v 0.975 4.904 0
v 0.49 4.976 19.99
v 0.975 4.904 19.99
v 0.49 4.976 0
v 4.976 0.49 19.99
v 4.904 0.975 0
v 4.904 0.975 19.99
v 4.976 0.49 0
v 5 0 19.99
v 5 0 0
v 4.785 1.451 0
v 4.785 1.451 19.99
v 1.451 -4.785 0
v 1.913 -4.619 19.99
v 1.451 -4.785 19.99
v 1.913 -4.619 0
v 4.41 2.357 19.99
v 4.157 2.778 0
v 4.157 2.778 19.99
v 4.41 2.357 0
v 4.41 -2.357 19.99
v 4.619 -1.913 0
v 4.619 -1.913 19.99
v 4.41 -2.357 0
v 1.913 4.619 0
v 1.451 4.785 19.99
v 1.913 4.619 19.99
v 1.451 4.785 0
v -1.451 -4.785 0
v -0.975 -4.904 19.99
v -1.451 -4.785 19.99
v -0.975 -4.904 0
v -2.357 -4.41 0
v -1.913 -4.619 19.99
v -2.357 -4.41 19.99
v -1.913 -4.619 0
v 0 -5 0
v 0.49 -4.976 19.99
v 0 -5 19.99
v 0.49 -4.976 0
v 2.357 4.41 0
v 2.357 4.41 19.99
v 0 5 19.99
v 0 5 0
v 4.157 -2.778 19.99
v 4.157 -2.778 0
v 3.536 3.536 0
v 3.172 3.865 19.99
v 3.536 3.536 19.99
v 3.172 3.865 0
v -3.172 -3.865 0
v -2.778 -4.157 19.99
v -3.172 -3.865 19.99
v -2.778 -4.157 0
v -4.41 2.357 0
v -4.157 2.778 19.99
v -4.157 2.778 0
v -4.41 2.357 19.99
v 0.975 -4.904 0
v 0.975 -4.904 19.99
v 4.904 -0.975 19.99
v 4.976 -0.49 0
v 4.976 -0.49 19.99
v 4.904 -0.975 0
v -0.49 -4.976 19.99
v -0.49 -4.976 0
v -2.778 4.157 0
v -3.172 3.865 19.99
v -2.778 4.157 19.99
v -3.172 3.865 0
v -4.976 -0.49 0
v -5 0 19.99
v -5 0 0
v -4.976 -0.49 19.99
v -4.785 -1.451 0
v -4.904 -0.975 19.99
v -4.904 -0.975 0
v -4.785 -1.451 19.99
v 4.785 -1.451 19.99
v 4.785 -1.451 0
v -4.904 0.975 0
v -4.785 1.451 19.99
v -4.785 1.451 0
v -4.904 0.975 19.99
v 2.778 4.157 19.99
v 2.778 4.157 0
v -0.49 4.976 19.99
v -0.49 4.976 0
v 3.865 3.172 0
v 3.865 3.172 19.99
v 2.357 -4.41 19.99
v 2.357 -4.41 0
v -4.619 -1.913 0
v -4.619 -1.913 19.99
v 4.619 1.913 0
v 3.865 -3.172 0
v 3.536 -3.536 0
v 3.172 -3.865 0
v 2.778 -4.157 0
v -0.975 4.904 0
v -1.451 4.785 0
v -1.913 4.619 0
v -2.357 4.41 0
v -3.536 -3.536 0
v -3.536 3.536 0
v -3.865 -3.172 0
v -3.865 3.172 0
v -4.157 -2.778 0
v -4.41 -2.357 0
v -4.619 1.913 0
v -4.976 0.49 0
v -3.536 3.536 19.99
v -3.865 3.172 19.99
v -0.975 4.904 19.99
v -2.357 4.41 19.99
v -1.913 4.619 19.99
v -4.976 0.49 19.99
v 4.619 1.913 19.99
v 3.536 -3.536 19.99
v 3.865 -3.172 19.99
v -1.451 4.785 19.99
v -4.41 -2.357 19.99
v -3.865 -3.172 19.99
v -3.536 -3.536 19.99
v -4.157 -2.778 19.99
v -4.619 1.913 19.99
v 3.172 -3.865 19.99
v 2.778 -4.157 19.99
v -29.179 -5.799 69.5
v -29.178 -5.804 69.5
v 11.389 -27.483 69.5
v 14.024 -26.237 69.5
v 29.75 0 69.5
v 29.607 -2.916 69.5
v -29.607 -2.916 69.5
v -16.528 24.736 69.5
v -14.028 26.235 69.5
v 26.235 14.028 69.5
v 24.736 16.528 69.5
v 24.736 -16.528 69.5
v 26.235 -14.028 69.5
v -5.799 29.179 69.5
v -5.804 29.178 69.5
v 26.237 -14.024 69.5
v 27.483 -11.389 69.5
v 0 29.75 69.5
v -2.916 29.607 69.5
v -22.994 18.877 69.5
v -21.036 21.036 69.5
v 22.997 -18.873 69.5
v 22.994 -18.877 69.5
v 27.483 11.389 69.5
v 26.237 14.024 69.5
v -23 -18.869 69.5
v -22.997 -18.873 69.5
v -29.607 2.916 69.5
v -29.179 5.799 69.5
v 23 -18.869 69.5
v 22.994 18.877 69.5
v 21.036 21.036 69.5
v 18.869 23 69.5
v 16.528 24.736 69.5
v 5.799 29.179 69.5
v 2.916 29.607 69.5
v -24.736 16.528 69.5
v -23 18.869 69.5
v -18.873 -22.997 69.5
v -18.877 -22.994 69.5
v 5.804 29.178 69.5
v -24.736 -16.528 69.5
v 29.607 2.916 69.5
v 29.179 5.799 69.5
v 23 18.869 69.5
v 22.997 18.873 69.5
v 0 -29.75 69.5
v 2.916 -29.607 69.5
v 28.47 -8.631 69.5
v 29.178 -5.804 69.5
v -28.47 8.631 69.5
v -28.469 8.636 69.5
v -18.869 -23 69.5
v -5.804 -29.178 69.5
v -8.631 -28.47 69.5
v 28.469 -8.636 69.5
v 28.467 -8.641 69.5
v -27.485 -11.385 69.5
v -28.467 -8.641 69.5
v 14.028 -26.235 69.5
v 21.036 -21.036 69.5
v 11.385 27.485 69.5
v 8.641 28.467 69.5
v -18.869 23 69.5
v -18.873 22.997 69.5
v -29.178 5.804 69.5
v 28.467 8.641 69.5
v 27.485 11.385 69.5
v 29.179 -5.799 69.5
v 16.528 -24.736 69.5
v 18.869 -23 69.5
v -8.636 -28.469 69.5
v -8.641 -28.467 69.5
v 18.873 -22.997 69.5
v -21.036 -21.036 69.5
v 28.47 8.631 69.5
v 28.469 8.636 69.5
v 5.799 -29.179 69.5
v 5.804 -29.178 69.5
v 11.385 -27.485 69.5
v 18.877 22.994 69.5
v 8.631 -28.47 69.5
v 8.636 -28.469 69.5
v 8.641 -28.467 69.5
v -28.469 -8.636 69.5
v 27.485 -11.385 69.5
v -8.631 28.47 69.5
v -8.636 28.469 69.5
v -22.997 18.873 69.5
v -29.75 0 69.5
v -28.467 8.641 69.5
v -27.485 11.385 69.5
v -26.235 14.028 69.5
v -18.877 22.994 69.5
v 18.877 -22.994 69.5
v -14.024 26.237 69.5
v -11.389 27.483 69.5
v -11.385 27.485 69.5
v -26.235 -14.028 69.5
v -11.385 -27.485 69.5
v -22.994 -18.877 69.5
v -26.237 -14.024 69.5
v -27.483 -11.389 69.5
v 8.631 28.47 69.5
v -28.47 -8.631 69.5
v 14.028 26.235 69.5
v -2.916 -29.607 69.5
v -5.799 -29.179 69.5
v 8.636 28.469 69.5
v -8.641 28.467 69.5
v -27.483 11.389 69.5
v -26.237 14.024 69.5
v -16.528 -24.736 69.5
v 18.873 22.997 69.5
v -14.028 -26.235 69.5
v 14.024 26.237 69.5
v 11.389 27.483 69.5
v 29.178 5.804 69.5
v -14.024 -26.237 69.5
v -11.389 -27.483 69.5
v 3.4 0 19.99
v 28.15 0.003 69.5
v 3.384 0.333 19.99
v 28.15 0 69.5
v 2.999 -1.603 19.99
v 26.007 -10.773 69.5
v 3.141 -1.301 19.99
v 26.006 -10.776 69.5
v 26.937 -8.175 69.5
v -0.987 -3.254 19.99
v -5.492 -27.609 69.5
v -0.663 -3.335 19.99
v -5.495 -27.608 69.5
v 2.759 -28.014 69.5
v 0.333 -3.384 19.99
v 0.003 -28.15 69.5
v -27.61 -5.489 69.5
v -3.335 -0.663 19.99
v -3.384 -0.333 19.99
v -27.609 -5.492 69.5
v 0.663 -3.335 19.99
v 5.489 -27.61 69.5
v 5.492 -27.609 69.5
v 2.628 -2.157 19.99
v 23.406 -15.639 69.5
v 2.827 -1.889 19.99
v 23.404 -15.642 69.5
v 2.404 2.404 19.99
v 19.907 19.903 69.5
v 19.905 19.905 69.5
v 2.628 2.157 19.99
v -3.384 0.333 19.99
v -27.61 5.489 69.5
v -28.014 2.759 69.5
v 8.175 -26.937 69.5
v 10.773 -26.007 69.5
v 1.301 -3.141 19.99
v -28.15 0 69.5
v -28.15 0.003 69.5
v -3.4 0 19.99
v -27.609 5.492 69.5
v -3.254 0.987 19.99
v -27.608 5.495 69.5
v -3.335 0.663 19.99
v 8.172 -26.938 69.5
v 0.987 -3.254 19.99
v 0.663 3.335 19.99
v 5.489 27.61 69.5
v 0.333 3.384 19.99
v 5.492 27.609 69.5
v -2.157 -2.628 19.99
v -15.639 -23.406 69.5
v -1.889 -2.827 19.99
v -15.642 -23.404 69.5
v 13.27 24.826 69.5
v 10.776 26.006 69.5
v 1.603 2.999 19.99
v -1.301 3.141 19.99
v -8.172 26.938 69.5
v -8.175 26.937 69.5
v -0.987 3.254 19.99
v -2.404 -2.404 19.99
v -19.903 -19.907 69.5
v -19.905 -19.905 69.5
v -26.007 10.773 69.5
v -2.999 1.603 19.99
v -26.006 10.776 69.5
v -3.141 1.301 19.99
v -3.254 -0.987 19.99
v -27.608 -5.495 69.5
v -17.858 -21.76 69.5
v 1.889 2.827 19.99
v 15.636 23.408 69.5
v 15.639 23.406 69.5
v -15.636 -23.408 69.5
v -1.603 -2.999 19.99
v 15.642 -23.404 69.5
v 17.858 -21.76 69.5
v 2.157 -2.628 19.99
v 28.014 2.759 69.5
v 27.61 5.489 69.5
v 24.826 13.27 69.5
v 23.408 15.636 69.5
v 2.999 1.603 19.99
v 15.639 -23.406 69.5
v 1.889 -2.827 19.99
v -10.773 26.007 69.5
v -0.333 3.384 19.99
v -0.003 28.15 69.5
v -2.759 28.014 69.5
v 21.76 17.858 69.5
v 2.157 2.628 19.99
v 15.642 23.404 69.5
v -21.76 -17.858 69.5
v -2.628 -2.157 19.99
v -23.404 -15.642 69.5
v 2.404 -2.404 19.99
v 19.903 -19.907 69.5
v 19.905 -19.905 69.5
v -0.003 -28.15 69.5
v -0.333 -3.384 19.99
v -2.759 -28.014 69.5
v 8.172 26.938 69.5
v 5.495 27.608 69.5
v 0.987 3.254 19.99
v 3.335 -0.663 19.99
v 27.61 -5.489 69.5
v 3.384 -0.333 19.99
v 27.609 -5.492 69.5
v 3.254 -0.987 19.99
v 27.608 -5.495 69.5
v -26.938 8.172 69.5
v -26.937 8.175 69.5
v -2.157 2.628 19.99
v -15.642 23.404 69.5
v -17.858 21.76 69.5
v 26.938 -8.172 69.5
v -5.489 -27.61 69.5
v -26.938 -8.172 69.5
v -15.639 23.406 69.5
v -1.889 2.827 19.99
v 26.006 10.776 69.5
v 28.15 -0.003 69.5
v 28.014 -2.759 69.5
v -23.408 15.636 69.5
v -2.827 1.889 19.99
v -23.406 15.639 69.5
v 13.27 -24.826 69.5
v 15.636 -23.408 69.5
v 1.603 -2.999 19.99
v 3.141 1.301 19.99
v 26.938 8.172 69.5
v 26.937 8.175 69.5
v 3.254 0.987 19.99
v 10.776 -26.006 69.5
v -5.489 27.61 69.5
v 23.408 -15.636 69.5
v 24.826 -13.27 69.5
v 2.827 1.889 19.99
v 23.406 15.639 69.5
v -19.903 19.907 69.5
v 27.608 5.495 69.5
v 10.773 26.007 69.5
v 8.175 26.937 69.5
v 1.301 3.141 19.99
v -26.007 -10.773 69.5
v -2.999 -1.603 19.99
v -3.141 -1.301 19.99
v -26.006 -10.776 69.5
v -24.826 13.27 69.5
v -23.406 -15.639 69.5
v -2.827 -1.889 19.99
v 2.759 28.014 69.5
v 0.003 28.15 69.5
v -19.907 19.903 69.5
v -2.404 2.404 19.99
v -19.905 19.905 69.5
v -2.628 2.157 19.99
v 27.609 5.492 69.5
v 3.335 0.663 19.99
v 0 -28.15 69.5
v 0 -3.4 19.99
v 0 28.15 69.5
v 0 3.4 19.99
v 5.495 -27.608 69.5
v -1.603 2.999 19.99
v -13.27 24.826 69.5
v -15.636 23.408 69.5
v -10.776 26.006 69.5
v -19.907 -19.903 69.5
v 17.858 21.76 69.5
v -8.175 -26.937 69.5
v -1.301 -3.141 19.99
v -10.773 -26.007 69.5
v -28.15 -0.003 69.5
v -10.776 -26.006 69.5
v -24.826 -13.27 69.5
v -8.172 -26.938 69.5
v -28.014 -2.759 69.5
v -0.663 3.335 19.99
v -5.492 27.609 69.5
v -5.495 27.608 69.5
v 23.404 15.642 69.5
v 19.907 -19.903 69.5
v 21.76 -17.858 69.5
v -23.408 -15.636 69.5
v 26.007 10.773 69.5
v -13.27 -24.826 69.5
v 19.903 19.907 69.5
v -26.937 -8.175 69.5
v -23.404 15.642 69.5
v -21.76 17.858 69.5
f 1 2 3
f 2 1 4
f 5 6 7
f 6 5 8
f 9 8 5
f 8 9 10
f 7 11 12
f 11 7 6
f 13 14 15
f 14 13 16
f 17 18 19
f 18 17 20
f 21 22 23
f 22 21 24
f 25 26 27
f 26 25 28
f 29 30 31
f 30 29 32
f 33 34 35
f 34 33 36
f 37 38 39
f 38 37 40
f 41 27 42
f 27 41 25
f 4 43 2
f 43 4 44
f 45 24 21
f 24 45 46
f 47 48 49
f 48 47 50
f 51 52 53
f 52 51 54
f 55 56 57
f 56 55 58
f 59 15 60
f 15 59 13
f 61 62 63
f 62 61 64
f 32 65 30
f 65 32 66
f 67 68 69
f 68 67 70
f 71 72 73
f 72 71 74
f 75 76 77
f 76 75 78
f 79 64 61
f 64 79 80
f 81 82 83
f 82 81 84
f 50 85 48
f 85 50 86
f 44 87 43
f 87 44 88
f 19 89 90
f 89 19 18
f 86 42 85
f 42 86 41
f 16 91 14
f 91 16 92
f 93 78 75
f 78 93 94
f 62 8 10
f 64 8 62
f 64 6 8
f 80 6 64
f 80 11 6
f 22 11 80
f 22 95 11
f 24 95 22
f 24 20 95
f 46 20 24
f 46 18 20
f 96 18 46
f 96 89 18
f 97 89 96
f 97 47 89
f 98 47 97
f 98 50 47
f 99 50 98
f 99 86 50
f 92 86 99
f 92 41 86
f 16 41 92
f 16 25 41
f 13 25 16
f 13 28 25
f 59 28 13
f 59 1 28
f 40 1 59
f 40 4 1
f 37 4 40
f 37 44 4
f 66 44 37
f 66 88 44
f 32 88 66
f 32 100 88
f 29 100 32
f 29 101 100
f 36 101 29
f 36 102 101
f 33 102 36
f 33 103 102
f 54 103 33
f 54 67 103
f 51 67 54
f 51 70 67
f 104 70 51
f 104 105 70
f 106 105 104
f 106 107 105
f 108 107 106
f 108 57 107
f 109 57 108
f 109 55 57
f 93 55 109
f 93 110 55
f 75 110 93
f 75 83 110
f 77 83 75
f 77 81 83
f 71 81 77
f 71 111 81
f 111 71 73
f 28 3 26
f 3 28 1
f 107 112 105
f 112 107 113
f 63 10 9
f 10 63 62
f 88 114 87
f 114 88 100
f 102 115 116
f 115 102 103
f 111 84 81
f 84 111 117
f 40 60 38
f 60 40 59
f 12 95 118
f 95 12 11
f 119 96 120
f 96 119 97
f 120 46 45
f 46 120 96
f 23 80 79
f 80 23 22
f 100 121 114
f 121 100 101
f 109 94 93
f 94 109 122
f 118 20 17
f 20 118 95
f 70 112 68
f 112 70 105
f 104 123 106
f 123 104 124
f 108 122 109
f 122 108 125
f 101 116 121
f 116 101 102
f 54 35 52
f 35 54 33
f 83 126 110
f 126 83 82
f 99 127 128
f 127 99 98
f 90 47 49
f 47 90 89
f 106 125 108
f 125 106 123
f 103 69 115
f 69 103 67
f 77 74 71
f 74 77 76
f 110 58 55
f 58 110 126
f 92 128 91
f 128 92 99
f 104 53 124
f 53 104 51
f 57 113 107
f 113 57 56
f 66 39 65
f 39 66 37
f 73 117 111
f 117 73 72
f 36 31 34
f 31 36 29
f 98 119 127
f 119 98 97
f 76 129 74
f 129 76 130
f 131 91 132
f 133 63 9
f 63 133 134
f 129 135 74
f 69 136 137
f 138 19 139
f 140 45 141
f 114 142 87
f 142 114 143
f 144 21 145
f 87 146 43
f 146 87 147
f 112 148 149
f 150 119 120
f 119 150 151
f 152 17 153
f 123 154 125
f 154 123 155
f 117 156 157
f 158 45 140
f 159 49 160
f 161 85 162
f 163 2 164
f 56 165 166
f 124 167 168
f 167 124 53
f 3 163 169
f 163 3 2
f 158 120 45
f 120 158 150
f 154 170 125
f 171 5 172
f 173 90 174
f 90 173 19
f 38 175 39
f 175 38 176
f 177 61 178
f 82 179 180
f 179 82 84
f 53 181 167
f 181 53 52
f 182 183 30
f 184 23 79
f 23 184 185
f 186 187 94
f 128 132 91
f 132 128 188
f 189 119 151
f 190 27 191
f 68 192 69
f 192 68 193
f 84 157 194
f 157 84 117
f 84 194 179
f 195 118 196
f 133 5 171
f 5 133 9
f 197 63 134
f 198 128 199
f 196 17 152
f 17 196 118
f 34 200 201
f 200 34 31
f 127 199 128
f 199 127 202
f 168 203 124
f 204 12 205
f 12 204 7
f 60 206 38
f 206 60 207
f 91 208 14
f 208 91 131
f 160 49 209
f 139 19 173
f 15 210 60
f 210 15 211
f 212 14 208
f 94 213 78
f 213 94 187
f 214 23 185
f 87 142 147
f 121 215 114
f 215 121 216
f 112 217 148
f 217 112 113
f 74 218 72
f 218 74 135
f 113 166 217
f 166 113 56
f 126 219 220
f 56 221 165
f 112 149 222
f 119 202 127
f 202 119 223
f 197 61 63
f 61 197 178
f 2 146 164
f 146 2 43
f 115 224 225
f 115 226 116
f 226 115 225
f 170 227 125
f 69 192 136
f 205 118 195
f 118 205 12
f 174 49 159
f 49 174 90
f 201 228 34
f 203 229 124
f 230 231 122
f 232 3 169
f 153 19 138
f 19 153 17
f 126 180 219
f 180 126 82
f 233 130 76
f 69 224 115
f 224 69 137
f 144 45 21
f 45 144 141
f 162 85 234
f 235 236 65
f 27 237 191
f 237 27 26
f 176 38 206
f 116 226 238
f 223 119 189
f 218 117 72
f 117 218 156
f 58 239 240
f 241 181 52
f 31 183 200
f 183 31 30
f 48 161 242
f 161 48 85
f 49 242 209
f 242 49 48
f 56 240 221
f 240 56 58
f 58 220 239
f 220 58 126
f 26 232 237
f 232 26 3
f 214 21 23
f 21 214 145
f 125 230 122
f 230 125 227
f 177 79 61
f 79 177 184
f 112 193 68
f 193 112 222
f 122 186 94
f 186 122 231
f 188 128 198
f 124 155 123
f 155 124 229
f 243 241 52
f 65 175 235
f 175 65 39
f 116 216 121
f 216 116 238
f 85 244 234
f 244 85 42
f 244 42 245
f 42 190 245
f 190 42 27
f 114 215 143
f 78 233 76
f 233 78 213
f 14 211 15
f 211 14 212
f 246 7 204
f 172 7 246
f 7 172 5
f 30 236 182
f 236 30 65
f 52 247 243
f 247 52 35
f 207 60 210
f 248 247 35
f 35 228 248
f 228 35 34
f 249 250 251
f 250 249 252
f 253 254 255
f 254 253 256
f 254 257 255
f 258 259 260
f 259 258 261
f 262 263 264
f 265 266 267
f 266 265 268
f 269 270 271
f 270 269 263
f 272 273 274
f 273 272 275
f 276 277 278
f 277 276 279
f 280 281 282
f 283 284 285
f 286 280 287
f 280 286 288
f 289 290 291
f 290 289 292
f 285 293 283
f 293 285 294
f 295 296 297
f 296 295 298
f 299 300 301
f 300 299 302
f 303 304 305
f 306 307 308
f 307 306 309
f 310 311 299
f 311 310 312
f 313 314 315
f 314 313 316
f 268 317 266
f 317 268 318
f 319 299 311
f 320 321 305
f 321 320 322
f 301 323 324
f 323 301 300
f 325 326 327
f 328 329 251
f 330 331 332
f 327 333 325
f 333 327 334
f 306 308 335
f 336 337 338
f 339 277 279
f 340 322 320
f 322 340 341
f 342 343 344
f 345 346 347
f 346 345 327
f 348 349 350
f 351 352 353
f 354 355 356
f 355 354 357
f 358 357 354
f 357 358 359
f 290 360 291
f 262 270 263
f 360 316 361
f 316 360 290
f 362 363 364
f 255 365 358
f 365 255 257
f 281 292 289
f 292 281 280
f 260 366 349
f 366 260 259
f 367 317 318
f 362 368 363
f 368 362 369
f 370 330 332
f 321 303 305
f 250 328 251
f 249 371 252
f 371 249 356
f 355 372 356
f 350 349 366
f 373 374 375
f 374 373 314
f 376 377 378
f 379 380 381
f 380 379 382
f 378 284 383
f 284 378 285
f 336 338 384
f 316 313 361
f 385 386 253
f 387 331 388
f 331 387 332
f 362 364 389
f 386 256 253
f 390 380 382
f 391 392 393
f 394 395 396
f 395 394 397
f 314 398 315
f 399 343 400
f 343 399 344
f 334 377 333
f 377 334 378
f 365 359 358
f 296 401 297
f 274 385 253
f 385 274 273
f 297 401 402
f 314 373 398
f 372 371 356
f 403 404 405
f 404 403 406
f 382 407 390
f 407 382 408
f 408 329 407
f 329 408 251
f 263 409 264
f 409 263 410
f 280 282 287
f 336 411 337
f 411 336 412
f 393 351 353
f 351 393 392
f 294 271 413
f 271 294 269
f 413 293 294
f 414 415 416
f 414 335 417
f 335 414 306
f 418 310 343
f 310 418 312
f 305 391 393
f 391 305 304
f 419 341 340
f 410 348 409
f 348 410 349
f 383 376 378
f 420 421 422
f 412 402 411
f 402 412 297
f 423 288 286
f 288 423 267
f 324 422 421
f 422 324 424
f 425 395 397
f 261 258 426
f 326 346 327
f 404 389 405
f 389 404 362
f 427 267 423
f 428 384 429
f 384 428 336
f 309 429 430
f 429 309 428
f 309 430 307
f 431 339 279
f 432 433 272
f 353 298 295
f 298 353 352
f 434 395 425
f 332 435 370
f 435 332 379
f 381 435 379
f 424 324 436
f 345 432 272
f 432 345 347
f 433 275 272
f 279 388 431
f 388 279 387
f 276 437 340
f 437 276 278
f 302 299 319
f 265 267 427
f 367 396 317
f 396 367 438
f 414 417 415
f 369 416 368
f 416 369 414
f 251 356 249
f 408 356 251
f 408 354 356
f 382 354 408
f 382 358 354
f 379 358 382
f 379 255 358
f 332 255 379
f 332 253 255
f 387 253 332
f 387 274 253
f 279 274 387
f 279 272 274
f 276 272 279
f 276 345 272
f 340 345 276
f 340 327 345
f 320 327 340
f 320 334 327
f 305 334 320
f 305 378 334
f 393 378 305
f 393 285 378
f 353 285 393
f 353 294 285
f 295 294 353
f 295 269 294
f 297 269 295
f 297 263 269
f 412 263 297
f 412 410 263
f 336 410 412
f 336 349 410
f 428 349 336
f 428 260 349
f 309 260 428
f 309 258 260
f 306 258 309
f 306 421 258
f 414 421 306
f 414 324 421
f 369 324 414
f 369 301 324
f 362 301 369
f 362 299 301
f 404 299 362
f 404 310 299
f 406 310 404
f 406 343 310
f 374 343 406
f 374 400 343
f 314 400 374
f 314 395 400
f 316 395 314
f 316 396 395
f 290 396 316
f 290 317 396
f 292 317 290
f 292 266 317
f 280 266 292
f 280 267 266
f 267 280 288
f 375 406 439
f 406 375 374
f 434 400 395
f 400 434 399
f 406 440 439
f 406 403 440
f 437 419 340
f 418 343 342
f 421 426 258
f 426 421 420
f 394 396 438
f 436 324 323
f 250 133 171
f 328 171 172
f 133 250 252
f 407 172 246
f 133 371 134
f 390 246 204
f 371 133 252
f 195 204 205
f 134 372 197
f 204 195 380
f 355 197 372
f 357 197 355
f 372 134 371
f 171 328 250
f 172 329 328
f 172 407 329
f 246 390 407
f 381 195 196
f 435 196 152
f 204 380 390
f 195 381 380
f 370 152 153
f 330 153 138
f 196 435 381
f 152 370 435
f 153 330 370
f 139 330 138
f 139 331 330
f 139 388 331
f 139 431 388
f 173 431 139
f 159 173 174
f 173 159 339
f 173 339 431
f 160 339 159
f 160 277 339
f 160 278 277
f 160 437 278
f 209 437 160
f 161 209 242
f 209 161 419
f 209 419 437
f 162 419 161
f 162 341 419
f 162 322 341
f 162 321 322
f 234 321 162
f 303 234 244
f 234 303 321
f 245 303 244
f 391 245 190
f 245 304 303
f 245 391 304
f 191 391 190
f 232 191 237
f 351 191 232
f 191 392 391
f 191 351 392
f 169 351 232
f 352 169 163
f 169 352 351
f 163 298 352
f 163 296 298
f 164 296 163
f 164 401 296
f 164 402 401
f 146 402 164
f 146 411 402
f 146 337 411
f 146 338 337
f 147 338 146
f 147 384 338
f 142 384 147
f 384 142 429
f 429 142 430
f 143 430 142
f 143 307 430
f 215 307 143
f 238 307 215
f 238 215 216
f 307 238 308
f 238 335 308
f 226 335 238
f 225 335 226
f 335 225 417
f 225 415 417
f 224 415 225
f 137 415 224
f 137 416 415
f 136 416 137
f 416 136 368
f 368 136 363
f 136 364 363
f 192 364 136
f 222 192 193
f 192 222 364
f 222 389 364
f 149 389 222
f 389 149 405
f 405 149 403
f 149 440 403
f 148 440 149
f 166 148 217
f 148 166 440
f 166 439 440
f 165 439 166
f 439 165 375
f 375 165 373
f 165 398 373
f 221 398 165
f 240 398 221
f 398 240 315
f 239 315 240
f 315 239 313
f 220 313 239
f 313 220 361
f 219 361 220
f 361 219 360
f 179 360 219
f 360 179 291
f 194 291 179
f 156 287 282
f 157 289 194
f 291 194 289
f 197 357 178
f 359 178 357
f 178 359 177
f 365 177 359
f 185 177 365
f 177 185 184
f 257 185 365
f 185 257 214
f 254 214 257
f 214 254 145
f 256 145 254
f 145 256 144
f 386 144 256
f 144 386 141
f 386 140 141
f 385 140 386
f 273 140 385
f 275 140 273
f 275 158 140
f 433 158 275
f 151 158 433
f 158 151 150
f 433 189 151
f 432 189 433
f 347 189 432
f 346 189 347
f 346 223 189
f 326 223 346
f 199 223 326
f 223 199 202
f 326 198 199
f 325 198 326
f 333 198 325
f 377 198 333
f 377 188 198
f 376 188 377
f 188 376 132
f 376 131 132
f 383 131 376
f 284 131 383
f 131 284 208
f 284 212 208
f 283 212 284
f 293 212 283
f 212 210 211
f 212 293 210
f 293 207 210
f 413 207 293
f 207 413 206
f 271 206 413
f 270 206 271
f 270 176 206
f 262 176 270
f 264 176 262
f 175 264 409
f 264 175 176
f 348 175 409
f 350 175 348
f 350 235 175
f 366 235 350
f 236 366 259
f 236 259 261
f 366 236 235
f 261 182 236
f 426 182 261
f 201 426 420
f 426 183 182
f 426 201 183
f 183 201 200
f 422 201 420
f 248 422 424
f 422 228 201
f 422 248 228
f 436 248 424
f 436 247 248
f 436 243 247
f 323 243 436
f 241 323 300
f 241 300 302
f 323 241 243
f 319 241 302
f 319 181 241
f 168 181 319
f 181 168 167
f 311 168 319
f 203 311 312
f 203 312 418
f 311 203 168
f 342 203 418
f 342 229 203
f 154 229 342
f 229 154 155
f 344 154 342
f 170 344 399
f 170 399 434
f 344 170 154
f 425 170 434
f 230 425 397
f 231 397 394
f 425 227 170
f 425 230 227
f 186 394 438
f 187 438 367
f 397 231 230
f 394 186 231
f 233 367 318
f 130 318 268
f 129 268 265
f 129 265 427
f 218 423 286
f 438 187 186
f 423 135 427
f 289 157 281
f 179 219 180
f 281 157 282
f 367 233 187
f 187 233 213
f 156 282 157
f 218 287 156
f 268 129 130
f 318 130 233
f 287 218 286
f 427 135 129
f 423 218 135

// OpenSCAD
// Lab funnel - printed upright, open top and bottom
// Units: mm

$fn = 64;

// --- Dimensions ---
spout_od      = 10;   // spout outer diameter
spout_id      = spout_od - 2 * 1.6;  // spout bore (6.8)
spout_h       = 20;   // spout height (z = 0 to 20)
cone_top_d    = 10;   // cone diameter at spout junction (z = 20)
cone_rim_d    = 60;   // cone rim diameter (z = 50)
cone_h        = cone_rim_d - cone_top_d; // cone height (30)
wall          = 1.6;  // uniform wall thickness

eps           = 0.5;  // cutter overshoot

// --- Model ---
difference() {
    union() {
        // Spout
        cylinder(d = spout_od, h = spout_h);
        // Cone (slightly overlapping the spout for a clean union)
        translate([0, 0, spout_h - 0.01])
            cylinder(d1 = cone_top_d, d2 = cone_rim_d, h = cone_h + 0.01);
    }
    // Through-bore: spout bore up to the cone, then cone wall thickness
    translate([0, 0, spout_h - 0.01])
        cylinder(d1 = spout_id,
                 d2 = cone_rim_d - 2 * wall,
                 h = cone_h + 0.01);
    // Rim cutter
    translate([0, 0, spout_h + cone_h - eps])
        cylinder(d = cone_rim_d + 2 * eps, h = eps);
}
